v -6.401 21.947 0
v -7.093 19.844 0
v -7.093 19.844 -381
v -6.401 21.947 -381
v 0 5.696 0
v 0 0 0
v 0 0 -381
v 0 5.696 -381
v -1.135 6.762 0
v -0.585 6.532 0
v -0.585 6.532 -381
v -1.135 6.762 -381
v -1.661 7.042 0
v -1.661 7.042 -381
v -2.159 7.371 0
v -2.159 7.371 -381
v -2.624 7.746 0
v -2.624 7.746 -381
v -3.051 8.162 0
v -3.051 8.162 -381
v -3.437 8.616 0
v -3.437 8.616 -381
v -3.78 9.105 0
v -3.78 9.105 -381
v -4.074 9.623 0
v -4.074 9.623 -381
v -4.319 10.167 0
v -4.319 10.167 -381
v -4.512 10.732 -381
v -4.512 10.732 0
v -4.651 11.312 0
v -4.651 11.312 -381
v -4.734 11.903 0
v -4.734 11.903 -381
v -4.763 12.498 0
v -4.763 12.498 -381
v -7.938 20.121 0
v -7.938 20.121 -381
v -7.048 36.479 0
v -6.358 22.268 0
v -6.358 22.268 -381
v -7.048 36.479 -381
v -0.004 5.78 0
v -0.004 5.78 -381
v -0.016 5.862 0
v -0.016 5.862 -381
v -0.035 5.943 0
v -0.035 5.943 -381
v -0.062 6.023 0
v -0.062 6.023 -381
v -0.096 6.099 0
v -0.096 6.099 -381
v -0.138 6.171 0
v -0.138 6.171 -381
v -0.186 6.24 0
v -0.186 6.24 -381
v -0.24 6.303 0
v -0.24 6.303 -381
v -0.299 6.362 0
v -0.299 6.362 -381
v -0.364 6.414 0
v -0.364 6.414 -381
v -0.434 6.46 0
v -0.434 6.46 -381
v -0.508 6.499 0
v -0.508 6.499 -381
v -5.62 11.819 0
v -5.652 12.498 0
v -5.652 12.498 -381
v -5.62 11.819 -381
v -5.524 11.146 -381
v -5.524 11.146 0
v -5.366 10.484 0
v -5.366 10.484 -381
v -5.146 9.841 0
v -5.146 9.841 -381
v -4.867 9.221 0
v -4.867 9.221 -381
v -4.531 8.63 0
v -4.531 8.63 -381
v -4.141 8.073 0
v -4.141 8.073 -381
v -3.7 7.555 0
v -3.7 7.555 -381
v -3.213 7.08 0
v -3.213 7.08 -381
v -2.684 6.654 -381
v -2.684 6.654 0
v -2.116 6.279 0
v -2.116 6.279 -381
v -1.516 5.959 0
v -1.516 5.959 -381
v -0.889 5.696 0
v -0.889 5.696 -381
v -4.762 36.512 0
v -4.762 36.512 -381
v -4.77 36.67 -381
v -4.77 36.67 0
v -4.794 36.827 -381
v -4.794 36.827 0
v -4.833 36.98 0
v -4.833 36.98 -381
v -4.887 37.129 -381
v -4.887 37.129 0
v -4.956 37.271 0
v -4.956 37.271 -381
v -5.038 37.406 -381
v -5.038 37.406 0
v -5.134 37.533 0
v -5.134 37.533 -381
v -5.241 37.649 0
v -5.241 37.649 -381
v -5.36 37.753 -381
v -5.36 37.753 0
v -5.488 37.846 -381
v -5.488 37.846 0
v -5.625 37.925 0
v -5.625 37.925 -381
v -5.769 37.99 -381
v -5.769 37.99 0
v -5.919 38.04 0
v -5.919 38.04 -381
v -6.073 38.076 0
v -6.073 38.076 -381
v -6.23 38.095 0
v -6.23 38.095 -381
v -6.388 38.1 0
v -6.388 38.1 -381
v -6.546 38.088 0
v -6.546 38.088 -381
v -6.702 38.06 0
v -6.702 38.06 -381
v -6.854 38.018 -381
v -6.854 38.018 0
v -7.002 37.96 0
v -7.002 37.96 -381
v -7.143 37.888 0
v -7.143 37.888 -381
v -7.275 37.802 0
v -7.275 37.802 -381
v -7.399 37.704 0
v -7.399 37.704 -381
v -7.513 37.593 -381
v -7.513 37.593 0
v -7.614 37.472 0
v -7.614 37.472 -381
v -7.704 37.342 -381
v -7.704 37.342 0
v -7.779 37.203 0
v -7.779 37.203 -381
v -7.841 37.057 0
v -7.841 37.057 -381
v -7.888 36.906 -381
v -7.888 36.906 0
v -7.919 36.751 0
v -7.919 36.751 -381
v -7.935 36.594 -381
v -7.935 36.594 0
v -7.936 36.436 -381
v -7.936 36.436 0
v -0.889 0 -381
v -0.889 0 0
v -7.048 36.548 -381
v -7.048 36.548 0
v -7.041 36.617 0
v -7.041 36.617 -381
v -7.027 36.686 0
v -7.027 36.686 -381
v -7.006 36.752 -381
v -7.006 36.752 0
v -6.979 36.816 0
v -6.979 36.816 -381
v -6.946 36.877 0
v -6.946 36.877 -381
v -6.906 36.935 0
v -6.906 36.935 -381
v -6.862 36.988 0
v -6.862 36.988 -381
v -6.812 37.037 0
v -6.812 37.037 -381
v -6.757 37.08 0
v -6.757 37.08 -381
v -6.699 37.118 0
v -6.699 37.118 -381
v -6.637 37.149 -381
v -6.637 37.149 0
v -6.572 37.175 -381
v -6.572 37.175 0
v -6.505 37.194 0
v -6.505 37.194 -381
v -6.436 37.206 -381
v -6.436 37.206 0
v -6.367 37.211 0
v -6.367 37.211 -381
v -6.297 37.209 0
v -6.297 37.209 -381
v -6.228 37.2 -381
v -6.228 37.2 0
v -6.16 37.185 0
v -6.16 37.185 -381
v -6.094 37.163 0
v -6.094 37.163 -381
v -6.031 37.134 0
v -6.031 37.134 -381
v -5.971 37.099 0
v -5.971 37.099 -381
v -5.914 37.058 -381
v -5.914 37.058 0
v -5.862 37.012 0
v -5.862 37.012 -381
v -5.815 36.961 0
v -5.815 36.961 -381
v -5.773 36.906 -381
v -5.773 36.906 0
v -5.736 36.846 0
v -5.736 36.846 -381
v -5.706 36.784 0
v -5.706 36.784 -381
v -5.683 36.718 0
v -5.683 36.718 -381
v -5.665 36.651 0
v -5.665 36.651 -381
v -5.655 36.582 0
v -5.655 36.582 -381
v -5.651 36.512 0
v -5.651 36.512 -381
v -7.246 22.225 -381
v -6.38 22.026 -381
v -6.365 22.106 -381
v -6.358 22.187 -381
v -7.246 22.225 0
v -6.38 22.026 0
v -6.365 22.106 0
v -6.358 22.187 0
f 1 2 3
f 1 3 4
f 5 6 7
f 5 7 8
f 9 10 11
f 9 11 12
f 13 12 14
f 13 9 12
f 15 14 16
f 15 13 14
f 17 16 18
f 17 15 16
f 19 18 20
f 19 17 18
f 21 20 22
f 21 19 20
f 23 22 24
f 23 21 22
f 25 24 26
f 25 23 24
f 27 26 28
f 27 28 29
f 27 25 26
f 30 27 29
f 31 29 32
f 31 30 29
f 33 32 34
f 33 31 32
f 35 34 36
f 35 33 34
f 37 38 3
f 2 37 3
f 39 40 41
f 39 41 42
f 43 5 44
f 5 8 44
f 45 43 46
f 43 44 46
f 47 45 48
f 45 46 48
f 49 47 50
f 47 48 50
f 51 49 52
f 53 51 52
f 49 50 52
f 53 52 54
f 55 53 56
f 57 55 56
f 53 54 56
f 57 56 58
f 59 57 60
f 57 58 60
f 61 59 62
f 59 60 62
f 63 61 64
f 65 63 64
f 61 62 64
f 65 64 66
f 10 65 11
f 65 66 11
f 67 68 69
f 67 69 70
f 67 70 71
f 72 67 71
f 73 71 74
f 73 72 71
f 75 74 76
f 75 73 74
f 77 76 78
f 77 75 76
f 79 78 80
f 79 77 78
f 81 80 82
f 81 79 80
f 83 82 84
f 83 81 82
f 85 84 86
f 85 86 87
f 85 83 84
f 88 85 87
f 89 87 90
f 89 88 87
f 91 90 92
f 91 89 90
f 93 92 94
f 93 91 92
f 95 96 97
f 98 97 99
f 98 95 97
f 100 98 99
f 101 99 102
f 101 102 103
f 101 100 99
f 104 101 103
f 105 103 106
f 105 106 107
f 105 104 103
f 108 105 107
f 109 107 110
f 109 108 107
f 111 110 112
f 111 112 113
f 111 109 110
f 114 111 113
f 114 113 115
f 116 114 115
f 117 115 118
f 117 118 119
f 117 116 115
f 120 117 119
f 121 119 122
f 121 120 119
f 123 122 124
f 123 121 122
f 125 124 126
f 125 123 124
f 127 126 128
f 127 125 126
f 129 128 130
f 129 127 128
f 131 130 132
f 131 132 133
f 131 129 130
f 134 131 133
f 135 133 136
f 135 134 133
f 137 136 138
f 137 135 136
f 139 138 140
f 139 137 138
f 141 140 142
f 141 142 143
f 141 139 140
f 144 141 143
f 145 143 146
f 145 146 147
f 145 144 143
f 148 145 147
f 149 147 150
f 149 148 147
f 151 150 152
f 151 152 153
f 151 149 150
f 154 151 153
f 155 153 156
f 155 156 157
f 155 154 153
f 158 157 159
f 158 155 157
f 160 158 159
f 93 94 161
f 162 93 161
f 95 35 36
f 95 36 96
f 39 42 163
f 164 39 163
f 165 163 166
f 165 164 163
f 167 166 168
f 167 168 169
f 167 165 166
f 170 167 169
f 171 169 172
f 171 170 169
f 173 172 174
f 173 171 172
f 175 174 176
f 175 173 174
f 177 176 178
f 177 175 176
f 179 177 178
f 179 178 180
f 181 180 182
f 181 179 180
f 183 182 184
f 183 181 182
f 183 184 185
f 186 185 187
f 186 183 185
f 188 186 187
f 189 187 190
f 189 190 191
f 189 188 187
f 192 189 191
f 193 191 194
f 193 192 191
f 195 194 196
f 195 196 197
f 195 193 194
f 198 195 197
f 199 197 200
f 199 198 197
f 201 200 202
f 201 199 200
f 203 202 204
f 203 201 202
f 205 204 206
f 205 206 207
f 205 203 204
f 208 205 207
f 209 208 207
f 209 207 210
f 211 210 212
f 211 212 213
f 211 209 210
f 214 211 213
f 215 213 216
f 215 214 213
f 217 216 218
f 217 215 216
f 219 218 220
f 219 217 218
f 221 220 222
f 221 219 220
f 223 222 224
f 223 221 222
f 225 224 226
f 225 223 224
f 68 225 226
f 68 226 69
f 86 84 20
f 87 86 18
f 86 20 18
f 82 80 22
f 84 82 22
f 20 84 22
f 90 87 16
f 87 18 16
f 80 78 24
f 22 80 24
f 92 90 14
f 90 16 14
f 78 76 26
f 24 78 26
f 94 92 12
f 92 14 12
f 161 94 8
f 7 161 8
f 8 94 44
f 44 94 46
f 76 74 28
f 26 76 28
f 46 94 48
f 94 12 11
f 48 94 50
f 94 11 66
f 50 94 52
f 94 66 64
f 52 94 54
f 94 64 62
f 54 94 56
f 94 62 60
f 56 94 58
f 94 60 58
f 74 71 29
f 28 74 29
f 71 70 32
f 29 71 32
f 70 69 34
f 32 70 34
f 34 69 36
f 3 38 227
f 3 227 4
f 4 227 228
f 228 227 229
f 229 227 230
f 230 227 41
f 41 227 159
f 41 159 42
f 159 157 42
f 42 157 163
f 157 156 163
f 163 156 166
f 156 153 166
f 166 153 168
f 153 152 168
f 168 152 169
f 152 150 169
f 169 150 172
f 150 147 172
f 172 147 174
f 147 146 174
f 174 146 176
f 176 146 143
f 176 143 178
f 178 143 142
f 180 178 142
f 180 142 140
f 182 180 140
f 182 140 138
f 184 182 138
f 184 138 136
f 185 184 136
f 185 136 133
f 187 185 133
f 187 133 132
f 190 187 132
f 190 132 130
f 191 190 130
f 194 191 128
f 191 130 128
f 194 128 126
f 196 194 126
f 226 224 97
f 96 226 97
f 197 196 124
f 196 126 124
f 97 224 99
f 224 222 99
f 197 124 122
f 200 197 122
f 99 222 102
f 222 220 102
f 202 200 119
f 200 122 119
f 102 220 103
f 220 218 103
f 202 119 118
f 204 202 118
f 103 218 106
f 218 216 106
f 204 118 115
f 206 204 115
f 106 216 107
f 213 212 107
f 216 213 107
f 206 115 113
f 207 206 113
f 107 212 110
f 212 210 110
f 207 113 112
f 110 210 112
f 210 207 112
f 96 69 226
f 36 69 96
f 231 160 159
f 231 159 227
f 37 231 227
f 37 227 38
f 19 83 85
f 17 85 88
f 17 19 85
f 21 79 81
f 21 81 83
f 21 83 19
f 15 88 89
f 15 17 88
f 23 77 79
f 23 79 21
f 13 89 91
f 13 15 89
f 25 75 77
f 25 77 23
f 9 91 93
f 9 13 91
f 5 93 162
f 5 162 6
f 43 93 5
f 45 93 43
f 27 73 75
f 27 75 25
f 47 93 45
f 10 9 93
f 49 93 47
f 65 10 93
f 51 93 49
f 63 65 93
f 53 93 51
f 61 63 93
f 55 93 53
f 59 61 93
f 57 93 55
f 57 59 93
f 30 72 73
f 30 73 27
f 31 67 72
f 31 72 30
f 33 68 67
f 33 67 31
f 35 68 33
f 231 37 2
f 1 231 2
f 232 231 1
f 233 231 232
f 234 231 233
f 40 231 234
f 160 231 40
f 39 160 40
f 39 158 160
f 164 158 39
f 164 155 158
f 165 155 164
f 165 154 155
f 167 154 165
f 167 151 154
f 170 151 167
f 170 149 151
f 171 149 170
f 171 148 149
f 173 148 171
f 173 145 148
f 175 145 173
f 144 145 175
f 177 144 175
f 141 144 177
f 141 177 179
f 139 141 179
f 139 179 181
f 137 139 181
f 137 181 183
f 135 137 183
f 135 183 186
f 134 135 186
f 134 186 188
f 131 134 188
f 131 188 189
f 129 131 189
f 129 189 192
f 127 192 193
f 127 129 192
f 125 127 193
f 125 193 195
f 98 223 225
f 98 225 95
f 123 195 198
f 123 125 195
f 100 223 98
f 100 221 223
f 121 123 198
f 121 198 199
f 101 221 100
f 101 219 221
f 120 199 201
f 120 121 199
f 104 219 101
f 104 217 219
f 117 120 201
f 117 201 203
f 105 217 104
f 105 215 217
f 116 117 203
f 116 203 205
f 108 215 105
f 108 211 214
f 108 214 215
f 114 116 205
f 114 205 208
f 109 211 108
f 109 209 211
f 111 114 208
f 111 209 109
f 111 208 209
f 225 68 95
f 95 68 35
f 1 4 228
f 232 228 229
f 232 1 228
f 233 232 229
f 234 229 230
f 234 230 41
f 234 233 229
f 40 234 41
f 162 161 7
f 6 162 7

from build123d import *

# Parameters (mm, degrees)
BOSS_EXTRUDE1_DEPTH = 381
FILLET1_R           = 0.889


with BuildPart() as part:
    # Sketch1 → Boss-Extrude1 (new body)
    with BuildSketch(Plane.XY):
        with BuildLine():
            Line((0, 0), (0, 6.35))
            ThreePointArc((0, 6.35), (-3.432615786, 8.609796095), (-4.7625, 12.498361062))
            Line((-4.7625, 12.498361062), (-4.7625, 36.5125))
            ThreePointArc((-4.7625, 36.5125), (-6.388490208, 38.099533318), (-7.935633548, 36.435542215))
            Line((-7.935633548, 36.435542215), (-7.2459333, 22.225))
            Line((-7.2459333, 22.225), (-7.9375, 20.121392457))
            Line((-7.9375, 20.121392457), (-7.092967191, 19.84375))
            Line((-7.092967191, 19.84375), (-6.401400491, 21.947357543))
            ThreePointArc((-6.401400491, 21.947357543), (-6.364969814, 22.105734183), (-6.357978513, 22.26809636))
            Line((-6.357978513, 22.26809636), (-7.047678761, 36.478638575))
            ThreePointArc((-7.047678761, 36.478638575), (-6.366935691, 37.21079466), (-5.6515, 36.5125))
            Line((-5.6515, 36.5125), (-5.6515, 12.498361062))
            ThreePointArc((-5.6515, 12.498361062), (-4.342529701, 8.346509818), (-0.889, 5.696150484))
            Line((-0.889, 5.696150484), (-0.889, 0))
            Line((-0.889, 0), (0, 0))
        make_face()
    extrude(amount=-BOSS_EXTRUDE1_DEPTH)

    # Fillet1
    fillet1_edges = [part.edges().sort_by_distance(p)[0] for p in [
        (0, 6.35, -190.5),
    ]]
    fillet(fillet1_edges, radius=FILLET1_R)


solid = part.part
